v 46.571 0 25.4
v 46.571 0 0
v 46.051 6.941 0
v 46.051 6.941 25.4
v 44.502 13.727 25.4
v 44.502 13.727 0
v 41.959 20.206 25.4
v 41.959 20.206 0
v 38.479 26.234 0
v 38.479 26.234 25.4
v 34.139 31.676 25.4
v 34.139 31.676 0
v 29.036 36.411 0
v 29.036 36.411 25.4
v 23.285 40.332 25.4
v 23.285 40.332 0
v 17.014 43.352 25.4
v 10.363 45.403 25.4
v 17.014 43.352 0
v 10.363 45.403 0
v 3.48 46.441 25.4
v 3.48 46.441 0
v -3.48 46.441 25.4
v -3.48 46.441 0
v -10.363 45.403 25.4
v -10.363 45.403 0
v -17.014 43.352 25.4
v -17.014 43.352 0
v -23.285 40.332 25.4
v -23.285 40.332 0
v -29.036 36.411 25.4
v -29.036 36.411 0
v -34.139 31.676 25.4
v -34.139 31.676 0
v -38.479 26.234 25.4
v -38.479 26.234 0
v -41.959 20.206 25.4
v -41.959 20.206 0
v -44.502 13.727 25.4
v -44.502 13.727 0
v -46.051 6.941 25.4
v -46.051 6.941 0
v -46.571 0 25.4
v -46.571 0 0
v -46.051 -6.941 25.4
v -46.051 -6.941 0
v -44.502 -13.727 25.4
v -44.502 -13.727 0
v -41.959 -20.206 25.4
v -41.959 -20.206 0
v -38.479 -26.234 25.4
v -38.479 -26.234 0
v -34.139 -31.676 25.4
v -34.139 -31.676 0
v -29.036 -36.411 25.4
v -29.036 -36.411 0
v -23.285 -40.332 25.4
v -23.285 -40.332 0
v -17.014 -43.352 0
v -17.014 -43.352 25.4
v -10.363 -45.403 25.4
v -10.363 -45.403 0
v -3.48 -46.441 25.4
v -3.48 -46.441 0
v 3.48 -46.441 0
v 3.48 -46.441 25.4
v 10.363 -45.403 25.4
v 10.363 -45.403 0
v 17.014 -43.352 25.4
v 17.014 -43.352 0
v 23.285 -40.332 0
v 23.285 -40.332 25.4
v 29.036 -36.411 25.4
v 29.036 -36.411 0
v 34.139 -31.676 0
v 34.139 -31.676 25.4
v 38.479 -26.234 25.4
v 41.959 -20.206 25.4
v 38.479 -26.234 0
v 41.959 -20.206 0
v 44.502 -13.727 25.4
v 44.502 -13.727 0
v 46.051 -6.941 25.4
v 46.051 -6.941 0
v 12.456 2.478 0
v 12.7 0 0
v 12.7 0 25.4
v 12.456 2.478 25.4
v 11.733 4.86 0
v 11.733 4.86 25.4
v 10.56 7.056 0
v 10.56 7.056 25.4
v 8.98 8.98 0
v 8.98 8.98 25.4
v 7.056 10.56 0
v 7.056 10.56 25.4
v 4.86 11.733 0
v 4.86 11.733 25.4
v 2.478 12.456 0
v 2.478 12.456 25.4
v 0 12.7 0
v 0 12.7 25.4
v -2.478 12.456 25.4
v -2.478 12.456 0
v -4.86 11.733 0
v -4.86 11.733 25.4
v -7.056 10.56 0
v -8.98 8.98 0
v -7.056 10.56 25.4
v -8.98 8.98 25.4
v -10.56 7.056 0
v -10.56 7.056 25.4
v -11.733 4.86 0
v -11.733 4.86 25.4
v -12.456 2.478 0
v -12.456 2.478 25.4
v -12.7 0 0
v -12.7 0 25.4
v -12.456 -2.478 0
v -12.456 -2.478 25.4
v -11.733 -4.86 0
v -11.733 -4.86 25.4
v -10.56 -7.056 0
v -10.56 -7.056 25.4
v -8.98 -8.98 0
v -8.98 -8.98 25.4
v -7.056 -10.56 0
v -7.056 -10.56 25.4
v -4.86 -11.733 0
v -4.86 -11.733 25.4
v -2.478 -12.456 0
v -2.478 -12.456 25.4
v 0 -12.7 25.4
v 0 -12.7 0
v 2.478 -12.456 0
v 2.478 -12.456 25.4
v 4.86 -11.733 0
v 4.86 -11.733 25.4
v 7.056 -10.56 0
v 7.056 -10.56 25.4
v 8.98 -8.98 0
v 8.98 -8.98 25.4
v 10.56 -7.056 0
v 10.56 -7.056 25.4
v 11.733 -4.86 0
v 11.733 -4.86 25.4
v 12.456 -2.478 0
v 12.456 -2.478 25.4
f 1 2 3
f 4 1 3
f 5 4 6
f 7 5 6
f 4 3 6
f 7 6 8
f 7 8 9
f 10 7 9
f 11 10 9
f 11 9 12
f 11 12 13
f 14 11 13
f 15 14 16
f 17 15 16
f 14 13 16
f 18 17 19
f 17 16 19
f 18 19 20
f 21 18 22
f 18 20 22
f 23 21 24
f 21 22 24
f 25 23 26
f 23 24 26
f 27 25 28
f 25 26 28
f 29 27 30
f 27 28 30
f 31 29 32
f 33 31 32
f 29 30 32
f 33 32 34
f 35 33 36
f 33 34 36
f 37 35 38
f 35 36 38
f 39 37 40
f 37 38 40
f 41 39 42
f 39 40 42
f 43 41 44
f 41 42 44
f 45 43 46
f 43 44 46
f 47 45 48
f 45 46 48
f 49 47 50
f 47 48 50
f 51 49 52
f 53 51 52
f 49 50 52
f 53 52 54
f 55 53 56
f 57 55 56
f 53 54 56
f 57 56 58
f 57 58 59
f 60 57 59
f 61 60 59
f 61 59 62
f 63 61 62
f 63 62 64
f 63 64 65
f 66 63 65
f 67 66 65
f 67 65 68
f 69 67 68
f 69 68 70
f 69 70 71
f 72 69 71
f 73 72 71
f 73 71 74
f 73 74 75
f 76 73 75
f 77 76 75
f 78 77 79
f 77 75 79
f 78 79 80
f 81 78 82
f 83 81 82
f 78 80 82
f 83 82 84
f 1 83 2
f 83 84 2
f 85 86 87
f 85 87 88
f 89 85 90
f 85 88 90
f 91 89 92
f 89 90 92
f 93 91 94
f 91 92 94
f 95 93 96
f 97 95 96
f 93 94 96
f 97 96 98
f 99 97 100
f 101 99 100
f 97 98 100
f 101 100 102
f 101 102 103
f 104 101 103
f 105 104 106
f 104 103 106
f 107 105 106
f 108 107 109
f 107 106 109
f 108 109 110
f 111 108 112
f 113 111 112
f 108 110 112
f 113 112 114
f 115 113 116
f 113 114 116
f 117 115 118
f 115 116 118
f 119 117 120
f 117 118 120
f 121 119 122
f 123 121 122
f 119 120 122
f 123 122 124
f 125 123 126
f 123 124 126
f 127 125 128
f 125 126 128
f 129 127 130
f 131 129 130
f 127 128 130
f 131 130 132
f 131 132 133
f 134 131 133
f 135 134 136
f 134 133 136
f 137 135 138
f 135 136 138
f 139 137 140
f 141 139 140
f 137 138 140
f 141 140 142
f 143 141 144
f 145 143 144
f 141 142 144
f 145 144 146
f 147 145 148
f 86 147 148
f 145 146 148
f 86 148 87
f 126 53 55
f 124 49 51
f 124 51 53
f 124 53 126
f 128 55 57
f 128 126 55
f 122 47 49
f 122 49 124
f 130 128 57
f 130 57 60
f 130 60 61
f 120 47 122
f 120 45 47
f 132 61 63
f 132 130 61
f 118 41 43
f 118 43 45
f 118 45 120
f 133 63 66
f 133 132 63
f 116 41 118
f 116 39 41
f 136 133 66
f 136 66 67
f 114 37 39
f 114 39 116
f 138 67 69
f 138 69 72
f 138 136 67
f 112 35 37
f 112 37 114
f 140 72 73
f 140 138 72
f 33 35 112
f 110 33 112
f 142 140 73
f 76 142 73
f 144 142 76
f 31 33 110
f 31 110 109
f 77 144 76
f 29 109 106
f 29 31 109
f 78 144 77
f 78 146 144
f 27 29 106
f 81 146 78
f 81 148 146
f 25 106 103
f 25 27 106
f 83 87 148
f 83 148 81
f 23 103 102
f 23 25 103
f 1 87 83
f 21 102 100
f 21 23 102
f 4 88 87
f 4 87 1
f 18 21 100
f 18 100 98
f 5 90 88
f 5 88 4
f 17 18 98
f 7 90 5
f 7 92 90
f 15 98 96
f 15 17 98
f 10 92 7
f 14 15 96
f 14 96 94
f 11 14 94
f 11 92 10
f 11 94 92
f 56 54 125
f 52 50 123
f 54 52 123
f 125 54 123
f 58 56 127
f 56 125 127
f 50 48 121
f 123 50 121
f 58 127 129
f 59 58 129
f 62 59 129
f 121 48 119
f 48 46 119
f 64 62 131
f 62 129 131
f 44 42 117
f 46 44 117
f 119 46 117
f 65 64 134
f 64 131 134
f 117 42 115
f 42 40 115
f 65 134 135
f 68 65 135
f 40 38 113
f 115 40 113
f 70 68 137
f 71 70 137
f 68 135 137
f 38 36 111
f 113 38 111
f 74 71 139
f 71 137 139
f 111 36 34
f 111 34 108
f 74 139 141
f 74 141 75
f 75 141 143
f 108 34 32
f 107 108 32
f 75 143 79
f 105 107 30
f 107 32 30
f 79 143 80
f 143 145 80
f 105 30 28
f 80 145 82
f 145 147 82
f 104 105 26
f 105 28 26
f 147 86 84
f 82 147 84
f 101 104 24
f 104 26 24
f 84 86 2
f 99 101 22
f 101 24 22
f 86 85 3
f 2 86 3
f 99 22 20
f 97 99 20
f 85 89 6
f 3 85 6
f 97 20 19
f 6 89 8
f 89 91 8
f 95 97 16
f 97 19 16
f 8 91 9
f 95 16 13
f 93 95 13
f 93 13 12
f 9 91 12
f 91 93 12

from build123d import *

# Parameters (mm, degrees)
F0_R      = 46.570843
F1_DEPTH  = 25.4
F2_R      = 13.732037
F3_DEPTH  = 25.4
F4_R      = 12.7
F5_DEPTH  = 25.4
F5_FACE_R = 12.7
F6_DEPTH  = 25.4
F7_R      = 12.7
F8_DEPTH  = 25.4


with BuildPart() as f1:
    # F0 (on Top) → F1 (new body)
    with BuildSketch(Plane.XY):
        Circle(F0_R)
    extrude(amount=F1_DEPTH)

    # F2 (on Top) → F3 (join)
    with BuildSketch(Plane.XY):
        Circle(F2_R)
    extrude(amount=F3_DEPTH)

    # F4 (on face) → F5 (join)
    with BuildSketch(Plane.XY.offset(25.4)):
        Circle(F4_R)
    extrude(amount=F5_DEPTH)

    # F5_face (on face) → F6 (cut)
    with BuildSketch(Plane.XY.offset(50.8)):
        Circle(F5_FACE_R)
    extrude(amount=-F6_DEPTH, mode=Mode.SUBTRACT)

    # F7 (on face) → F8 (cut)
    with BuildSketch(Plane.XY.offset(25.4)):
        Circle(F7_R)
    extrude(amount=-F8_DEPTH, mode=Mode.SUBTRACT)


solid = f1.part
